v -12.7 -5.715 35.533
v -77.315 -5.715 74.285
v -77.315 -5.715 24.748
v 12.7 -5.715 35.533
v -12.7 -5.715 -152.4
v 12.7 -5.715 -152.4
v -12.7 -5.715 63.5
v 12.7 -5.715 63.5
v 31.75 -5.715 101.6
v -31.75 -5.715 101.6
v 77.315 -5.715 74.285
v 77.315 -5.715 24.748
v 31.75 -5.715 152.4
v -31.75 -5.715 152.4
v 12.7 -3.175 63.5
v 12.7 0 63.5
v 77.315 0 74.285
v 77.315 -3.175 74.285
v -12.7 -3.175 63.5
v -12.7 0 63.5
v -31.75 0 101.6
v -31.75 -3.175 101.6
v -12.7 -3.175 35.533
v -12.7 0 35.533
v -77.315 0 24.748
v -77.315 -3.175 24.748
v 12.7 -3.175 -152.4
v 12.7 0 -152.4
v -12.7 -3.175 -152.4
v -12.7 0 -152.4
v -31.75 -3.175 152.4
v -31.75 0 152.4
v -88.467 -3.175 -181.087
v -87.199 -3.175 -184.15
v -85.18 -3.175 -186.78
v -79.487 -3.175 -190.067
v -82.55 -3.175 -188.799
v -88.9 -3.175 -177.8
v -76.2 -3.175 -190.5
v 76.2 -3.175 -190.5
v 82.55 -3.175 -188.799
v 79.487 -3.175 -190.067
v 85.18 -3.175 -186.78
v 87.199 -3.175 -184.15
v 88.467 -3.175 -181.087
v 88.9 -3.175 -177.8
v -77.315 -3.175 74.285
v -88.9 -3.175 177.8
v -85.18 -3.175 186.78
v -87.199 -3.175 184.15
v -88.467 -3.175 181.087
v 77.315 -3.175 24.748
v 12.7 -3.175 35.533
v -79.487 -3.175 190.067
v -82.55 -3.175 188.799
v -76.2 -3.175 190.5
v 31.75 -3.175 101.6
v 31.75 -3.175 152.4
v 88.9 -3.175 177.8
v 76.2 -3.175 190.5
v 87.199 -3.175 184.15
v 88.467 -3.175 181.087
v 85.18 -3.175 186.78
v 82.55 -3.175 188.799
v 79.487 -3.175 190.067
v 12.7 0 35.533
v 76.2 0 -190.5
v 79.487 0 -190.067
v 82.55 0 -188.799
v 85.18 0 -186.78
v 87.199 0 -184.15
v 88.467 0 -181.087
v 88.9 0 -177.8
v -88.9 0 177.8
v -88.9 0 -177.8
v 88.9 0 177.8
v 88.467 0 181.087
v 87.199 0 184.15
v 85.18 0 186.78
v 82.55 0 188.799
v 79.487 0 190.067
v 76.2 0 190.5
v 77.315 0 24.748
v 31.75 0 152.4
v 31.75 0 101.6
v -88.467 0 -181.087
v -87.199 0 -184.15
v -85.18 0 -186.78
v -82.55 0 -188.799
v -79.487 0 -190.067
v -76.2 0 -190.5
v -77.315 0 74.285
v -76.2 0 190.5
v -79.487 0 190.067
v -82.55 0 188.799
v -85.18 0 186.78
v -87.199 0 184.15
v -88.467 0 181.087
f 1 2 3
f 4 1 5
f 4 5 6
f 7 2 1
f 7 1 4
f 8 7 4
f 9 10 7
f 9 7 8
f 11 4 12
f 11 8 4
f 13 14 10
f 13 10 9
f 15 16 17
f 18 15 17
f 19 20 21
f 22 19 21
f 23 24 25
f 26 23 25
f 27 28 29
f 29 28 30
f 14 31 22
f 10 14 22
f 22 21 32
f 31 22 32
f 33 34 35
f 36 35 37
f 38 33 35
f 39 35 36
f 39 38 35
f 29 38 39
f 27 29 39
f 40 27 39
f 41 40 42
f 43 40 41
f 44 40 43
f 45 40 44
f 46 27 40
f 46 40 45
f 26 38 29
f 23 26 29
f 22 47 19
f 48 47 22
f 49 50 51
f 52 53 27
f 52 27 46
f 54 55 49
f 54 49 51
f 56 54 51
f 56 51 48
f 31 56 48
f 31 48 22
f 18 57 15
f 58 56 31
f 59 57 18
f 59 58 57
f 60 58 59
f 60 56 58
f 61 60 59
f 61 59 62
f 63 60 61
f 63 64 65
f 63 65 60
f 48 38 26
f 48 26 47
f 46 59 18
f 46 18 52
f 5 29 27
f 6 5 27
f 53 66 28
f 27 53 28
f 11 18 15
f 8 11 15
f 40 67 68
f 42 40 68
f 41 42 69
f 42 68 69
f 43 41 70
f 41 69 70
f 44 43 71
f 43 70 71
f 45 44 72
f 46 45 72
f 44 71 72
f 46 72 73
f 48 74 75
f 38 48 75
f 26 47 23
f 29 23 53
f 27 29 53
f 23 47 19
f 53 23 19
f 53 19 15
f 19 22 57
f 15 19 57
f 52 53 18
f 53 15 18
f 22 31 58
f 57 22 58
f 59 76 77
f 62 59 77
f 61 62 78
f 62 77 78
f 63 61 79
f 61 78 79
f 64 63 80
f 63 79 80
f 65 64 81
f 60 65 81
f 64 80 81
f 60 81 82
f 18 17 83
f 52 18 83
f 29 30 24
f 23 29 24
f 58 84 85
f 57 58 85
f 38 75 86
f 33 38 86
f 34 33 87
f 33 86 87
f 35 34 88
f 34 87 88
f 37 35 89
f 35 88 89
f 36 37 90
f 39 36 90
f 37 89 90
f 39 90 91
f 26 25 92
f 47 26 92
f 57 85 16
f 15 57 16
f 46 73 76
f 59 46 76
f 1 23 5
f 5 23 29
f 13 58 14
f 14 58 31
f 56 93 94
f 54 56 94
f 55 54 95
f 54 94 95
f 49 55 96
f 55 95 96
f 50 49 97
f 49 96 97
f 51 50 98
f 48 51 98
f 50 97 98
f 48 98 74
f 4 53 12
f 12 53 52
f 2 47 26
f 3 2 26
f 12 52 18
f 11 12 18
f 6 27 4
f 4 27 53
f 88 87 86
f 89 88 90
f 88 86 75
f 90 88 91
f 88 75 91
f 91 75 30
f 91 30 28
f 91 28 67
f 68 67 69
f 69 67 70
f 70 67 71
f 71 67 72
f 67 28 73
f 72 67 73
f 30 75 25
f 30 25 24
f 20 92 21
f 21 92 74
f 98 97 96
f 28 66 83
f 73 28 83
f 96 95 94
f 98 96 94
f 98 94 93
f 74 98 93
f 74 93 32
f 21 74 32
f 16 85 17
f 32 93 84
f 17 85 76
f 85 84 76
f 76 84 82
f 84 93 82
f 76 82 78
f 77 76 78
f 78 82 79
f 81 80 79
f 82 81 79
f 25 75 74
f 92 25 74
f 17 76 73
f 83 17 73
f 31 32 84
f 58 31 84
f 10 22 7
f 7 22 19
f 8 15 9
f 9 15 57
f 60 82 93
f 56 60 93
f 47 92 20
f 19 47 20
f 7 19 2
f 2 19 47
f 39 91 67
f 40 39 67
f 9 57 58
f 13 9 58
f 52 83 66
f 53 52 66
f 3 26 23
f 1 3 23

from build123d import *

# Parameters (mm, degrees)
F1_DEPTH = 3.175
F2_W     = 25.4
F2_H     = 152.4
F3_DEPTH = 2.54


with BuildPart() as f1:
    # F0 (on Front) → F1 (new body)
    with BuildSketch(Plane.XZ):
        with BuildLine():
            Line((76.2, 190.5), (-76.2, 190.5))
            ThreePointArc((-76.2, 190.5), (-85.180256, 186.780256), (-88.9, 177.8))
            Line((-88.9, 177.8), (-88.9, -177.8))
            ThreePointArc((-88.9, -177.8), (-85.180256, -186.780256), (-76.2, -190.5))
            Line((-76.2, -190.5), (76.2, -190.5))
            ThreePointArc((76.2, -190.5), (85.180256, -186.780256), (88.9, -177.8))
            Line((88.9, -177.8), (88.9, 177.8))
            ThreePointArc((88.9, 177.8), (85.180256, 186.780256), (76.2, 190.5))
        make_face()
        Polygon((-12.7, -152.4), (-12.7, 0), (-12.7, 35.532974), (-77.31542, 24.748182), (-77.31542, 74.284792), (-12.7, 63.5), (-31.75, 101.6), (-31.75, 152.4), (31.75, 152.4), (31.75, 101.6), (12.7, 63.5), (77.31542, 74.284792), (77.31542, 24.748182), (12.7, 35.532974), (12.7, 0), (12.7, -152.4), align=None, mode=Mode.SUBTRACT)
    extrude(amount=F1_DEPTH)


with BuildPart() as f3:
    # F2 (on face) → F3 (new body)
    with BuildSketch(Plane.XZ.offset(3.175)):
        Polygon((-12.7, 35.532974), (-12.7, 0), (12.7, 0), (12.7, 35.532974), (12.7, 63.5), (-12.7, 63.5), align=None)
        with Locations((0, -76.2)):
            Rectangle(F2_W, F2_H)
        Polygon((-77.31542, 24.748182), (-12.7, 35.532974), (-12.7, 63.5), (-77.31542, 74.284792), align=None)
        Polygon((12.7, 63.5), (12.7, 35.532974), (77.31542, 24.748182), (77.31542, 74.284792), align=None)
        Polygon((-31.75, 101.6), (-12.7, 63.5), (12.7, 63.5), (31.75, 101.6), (31.75, 152.4), (-31.75, 152.4), align=None)
    extrude(amount=F3_DEPTH)


solid = Compound([f1.part, f3.part])
